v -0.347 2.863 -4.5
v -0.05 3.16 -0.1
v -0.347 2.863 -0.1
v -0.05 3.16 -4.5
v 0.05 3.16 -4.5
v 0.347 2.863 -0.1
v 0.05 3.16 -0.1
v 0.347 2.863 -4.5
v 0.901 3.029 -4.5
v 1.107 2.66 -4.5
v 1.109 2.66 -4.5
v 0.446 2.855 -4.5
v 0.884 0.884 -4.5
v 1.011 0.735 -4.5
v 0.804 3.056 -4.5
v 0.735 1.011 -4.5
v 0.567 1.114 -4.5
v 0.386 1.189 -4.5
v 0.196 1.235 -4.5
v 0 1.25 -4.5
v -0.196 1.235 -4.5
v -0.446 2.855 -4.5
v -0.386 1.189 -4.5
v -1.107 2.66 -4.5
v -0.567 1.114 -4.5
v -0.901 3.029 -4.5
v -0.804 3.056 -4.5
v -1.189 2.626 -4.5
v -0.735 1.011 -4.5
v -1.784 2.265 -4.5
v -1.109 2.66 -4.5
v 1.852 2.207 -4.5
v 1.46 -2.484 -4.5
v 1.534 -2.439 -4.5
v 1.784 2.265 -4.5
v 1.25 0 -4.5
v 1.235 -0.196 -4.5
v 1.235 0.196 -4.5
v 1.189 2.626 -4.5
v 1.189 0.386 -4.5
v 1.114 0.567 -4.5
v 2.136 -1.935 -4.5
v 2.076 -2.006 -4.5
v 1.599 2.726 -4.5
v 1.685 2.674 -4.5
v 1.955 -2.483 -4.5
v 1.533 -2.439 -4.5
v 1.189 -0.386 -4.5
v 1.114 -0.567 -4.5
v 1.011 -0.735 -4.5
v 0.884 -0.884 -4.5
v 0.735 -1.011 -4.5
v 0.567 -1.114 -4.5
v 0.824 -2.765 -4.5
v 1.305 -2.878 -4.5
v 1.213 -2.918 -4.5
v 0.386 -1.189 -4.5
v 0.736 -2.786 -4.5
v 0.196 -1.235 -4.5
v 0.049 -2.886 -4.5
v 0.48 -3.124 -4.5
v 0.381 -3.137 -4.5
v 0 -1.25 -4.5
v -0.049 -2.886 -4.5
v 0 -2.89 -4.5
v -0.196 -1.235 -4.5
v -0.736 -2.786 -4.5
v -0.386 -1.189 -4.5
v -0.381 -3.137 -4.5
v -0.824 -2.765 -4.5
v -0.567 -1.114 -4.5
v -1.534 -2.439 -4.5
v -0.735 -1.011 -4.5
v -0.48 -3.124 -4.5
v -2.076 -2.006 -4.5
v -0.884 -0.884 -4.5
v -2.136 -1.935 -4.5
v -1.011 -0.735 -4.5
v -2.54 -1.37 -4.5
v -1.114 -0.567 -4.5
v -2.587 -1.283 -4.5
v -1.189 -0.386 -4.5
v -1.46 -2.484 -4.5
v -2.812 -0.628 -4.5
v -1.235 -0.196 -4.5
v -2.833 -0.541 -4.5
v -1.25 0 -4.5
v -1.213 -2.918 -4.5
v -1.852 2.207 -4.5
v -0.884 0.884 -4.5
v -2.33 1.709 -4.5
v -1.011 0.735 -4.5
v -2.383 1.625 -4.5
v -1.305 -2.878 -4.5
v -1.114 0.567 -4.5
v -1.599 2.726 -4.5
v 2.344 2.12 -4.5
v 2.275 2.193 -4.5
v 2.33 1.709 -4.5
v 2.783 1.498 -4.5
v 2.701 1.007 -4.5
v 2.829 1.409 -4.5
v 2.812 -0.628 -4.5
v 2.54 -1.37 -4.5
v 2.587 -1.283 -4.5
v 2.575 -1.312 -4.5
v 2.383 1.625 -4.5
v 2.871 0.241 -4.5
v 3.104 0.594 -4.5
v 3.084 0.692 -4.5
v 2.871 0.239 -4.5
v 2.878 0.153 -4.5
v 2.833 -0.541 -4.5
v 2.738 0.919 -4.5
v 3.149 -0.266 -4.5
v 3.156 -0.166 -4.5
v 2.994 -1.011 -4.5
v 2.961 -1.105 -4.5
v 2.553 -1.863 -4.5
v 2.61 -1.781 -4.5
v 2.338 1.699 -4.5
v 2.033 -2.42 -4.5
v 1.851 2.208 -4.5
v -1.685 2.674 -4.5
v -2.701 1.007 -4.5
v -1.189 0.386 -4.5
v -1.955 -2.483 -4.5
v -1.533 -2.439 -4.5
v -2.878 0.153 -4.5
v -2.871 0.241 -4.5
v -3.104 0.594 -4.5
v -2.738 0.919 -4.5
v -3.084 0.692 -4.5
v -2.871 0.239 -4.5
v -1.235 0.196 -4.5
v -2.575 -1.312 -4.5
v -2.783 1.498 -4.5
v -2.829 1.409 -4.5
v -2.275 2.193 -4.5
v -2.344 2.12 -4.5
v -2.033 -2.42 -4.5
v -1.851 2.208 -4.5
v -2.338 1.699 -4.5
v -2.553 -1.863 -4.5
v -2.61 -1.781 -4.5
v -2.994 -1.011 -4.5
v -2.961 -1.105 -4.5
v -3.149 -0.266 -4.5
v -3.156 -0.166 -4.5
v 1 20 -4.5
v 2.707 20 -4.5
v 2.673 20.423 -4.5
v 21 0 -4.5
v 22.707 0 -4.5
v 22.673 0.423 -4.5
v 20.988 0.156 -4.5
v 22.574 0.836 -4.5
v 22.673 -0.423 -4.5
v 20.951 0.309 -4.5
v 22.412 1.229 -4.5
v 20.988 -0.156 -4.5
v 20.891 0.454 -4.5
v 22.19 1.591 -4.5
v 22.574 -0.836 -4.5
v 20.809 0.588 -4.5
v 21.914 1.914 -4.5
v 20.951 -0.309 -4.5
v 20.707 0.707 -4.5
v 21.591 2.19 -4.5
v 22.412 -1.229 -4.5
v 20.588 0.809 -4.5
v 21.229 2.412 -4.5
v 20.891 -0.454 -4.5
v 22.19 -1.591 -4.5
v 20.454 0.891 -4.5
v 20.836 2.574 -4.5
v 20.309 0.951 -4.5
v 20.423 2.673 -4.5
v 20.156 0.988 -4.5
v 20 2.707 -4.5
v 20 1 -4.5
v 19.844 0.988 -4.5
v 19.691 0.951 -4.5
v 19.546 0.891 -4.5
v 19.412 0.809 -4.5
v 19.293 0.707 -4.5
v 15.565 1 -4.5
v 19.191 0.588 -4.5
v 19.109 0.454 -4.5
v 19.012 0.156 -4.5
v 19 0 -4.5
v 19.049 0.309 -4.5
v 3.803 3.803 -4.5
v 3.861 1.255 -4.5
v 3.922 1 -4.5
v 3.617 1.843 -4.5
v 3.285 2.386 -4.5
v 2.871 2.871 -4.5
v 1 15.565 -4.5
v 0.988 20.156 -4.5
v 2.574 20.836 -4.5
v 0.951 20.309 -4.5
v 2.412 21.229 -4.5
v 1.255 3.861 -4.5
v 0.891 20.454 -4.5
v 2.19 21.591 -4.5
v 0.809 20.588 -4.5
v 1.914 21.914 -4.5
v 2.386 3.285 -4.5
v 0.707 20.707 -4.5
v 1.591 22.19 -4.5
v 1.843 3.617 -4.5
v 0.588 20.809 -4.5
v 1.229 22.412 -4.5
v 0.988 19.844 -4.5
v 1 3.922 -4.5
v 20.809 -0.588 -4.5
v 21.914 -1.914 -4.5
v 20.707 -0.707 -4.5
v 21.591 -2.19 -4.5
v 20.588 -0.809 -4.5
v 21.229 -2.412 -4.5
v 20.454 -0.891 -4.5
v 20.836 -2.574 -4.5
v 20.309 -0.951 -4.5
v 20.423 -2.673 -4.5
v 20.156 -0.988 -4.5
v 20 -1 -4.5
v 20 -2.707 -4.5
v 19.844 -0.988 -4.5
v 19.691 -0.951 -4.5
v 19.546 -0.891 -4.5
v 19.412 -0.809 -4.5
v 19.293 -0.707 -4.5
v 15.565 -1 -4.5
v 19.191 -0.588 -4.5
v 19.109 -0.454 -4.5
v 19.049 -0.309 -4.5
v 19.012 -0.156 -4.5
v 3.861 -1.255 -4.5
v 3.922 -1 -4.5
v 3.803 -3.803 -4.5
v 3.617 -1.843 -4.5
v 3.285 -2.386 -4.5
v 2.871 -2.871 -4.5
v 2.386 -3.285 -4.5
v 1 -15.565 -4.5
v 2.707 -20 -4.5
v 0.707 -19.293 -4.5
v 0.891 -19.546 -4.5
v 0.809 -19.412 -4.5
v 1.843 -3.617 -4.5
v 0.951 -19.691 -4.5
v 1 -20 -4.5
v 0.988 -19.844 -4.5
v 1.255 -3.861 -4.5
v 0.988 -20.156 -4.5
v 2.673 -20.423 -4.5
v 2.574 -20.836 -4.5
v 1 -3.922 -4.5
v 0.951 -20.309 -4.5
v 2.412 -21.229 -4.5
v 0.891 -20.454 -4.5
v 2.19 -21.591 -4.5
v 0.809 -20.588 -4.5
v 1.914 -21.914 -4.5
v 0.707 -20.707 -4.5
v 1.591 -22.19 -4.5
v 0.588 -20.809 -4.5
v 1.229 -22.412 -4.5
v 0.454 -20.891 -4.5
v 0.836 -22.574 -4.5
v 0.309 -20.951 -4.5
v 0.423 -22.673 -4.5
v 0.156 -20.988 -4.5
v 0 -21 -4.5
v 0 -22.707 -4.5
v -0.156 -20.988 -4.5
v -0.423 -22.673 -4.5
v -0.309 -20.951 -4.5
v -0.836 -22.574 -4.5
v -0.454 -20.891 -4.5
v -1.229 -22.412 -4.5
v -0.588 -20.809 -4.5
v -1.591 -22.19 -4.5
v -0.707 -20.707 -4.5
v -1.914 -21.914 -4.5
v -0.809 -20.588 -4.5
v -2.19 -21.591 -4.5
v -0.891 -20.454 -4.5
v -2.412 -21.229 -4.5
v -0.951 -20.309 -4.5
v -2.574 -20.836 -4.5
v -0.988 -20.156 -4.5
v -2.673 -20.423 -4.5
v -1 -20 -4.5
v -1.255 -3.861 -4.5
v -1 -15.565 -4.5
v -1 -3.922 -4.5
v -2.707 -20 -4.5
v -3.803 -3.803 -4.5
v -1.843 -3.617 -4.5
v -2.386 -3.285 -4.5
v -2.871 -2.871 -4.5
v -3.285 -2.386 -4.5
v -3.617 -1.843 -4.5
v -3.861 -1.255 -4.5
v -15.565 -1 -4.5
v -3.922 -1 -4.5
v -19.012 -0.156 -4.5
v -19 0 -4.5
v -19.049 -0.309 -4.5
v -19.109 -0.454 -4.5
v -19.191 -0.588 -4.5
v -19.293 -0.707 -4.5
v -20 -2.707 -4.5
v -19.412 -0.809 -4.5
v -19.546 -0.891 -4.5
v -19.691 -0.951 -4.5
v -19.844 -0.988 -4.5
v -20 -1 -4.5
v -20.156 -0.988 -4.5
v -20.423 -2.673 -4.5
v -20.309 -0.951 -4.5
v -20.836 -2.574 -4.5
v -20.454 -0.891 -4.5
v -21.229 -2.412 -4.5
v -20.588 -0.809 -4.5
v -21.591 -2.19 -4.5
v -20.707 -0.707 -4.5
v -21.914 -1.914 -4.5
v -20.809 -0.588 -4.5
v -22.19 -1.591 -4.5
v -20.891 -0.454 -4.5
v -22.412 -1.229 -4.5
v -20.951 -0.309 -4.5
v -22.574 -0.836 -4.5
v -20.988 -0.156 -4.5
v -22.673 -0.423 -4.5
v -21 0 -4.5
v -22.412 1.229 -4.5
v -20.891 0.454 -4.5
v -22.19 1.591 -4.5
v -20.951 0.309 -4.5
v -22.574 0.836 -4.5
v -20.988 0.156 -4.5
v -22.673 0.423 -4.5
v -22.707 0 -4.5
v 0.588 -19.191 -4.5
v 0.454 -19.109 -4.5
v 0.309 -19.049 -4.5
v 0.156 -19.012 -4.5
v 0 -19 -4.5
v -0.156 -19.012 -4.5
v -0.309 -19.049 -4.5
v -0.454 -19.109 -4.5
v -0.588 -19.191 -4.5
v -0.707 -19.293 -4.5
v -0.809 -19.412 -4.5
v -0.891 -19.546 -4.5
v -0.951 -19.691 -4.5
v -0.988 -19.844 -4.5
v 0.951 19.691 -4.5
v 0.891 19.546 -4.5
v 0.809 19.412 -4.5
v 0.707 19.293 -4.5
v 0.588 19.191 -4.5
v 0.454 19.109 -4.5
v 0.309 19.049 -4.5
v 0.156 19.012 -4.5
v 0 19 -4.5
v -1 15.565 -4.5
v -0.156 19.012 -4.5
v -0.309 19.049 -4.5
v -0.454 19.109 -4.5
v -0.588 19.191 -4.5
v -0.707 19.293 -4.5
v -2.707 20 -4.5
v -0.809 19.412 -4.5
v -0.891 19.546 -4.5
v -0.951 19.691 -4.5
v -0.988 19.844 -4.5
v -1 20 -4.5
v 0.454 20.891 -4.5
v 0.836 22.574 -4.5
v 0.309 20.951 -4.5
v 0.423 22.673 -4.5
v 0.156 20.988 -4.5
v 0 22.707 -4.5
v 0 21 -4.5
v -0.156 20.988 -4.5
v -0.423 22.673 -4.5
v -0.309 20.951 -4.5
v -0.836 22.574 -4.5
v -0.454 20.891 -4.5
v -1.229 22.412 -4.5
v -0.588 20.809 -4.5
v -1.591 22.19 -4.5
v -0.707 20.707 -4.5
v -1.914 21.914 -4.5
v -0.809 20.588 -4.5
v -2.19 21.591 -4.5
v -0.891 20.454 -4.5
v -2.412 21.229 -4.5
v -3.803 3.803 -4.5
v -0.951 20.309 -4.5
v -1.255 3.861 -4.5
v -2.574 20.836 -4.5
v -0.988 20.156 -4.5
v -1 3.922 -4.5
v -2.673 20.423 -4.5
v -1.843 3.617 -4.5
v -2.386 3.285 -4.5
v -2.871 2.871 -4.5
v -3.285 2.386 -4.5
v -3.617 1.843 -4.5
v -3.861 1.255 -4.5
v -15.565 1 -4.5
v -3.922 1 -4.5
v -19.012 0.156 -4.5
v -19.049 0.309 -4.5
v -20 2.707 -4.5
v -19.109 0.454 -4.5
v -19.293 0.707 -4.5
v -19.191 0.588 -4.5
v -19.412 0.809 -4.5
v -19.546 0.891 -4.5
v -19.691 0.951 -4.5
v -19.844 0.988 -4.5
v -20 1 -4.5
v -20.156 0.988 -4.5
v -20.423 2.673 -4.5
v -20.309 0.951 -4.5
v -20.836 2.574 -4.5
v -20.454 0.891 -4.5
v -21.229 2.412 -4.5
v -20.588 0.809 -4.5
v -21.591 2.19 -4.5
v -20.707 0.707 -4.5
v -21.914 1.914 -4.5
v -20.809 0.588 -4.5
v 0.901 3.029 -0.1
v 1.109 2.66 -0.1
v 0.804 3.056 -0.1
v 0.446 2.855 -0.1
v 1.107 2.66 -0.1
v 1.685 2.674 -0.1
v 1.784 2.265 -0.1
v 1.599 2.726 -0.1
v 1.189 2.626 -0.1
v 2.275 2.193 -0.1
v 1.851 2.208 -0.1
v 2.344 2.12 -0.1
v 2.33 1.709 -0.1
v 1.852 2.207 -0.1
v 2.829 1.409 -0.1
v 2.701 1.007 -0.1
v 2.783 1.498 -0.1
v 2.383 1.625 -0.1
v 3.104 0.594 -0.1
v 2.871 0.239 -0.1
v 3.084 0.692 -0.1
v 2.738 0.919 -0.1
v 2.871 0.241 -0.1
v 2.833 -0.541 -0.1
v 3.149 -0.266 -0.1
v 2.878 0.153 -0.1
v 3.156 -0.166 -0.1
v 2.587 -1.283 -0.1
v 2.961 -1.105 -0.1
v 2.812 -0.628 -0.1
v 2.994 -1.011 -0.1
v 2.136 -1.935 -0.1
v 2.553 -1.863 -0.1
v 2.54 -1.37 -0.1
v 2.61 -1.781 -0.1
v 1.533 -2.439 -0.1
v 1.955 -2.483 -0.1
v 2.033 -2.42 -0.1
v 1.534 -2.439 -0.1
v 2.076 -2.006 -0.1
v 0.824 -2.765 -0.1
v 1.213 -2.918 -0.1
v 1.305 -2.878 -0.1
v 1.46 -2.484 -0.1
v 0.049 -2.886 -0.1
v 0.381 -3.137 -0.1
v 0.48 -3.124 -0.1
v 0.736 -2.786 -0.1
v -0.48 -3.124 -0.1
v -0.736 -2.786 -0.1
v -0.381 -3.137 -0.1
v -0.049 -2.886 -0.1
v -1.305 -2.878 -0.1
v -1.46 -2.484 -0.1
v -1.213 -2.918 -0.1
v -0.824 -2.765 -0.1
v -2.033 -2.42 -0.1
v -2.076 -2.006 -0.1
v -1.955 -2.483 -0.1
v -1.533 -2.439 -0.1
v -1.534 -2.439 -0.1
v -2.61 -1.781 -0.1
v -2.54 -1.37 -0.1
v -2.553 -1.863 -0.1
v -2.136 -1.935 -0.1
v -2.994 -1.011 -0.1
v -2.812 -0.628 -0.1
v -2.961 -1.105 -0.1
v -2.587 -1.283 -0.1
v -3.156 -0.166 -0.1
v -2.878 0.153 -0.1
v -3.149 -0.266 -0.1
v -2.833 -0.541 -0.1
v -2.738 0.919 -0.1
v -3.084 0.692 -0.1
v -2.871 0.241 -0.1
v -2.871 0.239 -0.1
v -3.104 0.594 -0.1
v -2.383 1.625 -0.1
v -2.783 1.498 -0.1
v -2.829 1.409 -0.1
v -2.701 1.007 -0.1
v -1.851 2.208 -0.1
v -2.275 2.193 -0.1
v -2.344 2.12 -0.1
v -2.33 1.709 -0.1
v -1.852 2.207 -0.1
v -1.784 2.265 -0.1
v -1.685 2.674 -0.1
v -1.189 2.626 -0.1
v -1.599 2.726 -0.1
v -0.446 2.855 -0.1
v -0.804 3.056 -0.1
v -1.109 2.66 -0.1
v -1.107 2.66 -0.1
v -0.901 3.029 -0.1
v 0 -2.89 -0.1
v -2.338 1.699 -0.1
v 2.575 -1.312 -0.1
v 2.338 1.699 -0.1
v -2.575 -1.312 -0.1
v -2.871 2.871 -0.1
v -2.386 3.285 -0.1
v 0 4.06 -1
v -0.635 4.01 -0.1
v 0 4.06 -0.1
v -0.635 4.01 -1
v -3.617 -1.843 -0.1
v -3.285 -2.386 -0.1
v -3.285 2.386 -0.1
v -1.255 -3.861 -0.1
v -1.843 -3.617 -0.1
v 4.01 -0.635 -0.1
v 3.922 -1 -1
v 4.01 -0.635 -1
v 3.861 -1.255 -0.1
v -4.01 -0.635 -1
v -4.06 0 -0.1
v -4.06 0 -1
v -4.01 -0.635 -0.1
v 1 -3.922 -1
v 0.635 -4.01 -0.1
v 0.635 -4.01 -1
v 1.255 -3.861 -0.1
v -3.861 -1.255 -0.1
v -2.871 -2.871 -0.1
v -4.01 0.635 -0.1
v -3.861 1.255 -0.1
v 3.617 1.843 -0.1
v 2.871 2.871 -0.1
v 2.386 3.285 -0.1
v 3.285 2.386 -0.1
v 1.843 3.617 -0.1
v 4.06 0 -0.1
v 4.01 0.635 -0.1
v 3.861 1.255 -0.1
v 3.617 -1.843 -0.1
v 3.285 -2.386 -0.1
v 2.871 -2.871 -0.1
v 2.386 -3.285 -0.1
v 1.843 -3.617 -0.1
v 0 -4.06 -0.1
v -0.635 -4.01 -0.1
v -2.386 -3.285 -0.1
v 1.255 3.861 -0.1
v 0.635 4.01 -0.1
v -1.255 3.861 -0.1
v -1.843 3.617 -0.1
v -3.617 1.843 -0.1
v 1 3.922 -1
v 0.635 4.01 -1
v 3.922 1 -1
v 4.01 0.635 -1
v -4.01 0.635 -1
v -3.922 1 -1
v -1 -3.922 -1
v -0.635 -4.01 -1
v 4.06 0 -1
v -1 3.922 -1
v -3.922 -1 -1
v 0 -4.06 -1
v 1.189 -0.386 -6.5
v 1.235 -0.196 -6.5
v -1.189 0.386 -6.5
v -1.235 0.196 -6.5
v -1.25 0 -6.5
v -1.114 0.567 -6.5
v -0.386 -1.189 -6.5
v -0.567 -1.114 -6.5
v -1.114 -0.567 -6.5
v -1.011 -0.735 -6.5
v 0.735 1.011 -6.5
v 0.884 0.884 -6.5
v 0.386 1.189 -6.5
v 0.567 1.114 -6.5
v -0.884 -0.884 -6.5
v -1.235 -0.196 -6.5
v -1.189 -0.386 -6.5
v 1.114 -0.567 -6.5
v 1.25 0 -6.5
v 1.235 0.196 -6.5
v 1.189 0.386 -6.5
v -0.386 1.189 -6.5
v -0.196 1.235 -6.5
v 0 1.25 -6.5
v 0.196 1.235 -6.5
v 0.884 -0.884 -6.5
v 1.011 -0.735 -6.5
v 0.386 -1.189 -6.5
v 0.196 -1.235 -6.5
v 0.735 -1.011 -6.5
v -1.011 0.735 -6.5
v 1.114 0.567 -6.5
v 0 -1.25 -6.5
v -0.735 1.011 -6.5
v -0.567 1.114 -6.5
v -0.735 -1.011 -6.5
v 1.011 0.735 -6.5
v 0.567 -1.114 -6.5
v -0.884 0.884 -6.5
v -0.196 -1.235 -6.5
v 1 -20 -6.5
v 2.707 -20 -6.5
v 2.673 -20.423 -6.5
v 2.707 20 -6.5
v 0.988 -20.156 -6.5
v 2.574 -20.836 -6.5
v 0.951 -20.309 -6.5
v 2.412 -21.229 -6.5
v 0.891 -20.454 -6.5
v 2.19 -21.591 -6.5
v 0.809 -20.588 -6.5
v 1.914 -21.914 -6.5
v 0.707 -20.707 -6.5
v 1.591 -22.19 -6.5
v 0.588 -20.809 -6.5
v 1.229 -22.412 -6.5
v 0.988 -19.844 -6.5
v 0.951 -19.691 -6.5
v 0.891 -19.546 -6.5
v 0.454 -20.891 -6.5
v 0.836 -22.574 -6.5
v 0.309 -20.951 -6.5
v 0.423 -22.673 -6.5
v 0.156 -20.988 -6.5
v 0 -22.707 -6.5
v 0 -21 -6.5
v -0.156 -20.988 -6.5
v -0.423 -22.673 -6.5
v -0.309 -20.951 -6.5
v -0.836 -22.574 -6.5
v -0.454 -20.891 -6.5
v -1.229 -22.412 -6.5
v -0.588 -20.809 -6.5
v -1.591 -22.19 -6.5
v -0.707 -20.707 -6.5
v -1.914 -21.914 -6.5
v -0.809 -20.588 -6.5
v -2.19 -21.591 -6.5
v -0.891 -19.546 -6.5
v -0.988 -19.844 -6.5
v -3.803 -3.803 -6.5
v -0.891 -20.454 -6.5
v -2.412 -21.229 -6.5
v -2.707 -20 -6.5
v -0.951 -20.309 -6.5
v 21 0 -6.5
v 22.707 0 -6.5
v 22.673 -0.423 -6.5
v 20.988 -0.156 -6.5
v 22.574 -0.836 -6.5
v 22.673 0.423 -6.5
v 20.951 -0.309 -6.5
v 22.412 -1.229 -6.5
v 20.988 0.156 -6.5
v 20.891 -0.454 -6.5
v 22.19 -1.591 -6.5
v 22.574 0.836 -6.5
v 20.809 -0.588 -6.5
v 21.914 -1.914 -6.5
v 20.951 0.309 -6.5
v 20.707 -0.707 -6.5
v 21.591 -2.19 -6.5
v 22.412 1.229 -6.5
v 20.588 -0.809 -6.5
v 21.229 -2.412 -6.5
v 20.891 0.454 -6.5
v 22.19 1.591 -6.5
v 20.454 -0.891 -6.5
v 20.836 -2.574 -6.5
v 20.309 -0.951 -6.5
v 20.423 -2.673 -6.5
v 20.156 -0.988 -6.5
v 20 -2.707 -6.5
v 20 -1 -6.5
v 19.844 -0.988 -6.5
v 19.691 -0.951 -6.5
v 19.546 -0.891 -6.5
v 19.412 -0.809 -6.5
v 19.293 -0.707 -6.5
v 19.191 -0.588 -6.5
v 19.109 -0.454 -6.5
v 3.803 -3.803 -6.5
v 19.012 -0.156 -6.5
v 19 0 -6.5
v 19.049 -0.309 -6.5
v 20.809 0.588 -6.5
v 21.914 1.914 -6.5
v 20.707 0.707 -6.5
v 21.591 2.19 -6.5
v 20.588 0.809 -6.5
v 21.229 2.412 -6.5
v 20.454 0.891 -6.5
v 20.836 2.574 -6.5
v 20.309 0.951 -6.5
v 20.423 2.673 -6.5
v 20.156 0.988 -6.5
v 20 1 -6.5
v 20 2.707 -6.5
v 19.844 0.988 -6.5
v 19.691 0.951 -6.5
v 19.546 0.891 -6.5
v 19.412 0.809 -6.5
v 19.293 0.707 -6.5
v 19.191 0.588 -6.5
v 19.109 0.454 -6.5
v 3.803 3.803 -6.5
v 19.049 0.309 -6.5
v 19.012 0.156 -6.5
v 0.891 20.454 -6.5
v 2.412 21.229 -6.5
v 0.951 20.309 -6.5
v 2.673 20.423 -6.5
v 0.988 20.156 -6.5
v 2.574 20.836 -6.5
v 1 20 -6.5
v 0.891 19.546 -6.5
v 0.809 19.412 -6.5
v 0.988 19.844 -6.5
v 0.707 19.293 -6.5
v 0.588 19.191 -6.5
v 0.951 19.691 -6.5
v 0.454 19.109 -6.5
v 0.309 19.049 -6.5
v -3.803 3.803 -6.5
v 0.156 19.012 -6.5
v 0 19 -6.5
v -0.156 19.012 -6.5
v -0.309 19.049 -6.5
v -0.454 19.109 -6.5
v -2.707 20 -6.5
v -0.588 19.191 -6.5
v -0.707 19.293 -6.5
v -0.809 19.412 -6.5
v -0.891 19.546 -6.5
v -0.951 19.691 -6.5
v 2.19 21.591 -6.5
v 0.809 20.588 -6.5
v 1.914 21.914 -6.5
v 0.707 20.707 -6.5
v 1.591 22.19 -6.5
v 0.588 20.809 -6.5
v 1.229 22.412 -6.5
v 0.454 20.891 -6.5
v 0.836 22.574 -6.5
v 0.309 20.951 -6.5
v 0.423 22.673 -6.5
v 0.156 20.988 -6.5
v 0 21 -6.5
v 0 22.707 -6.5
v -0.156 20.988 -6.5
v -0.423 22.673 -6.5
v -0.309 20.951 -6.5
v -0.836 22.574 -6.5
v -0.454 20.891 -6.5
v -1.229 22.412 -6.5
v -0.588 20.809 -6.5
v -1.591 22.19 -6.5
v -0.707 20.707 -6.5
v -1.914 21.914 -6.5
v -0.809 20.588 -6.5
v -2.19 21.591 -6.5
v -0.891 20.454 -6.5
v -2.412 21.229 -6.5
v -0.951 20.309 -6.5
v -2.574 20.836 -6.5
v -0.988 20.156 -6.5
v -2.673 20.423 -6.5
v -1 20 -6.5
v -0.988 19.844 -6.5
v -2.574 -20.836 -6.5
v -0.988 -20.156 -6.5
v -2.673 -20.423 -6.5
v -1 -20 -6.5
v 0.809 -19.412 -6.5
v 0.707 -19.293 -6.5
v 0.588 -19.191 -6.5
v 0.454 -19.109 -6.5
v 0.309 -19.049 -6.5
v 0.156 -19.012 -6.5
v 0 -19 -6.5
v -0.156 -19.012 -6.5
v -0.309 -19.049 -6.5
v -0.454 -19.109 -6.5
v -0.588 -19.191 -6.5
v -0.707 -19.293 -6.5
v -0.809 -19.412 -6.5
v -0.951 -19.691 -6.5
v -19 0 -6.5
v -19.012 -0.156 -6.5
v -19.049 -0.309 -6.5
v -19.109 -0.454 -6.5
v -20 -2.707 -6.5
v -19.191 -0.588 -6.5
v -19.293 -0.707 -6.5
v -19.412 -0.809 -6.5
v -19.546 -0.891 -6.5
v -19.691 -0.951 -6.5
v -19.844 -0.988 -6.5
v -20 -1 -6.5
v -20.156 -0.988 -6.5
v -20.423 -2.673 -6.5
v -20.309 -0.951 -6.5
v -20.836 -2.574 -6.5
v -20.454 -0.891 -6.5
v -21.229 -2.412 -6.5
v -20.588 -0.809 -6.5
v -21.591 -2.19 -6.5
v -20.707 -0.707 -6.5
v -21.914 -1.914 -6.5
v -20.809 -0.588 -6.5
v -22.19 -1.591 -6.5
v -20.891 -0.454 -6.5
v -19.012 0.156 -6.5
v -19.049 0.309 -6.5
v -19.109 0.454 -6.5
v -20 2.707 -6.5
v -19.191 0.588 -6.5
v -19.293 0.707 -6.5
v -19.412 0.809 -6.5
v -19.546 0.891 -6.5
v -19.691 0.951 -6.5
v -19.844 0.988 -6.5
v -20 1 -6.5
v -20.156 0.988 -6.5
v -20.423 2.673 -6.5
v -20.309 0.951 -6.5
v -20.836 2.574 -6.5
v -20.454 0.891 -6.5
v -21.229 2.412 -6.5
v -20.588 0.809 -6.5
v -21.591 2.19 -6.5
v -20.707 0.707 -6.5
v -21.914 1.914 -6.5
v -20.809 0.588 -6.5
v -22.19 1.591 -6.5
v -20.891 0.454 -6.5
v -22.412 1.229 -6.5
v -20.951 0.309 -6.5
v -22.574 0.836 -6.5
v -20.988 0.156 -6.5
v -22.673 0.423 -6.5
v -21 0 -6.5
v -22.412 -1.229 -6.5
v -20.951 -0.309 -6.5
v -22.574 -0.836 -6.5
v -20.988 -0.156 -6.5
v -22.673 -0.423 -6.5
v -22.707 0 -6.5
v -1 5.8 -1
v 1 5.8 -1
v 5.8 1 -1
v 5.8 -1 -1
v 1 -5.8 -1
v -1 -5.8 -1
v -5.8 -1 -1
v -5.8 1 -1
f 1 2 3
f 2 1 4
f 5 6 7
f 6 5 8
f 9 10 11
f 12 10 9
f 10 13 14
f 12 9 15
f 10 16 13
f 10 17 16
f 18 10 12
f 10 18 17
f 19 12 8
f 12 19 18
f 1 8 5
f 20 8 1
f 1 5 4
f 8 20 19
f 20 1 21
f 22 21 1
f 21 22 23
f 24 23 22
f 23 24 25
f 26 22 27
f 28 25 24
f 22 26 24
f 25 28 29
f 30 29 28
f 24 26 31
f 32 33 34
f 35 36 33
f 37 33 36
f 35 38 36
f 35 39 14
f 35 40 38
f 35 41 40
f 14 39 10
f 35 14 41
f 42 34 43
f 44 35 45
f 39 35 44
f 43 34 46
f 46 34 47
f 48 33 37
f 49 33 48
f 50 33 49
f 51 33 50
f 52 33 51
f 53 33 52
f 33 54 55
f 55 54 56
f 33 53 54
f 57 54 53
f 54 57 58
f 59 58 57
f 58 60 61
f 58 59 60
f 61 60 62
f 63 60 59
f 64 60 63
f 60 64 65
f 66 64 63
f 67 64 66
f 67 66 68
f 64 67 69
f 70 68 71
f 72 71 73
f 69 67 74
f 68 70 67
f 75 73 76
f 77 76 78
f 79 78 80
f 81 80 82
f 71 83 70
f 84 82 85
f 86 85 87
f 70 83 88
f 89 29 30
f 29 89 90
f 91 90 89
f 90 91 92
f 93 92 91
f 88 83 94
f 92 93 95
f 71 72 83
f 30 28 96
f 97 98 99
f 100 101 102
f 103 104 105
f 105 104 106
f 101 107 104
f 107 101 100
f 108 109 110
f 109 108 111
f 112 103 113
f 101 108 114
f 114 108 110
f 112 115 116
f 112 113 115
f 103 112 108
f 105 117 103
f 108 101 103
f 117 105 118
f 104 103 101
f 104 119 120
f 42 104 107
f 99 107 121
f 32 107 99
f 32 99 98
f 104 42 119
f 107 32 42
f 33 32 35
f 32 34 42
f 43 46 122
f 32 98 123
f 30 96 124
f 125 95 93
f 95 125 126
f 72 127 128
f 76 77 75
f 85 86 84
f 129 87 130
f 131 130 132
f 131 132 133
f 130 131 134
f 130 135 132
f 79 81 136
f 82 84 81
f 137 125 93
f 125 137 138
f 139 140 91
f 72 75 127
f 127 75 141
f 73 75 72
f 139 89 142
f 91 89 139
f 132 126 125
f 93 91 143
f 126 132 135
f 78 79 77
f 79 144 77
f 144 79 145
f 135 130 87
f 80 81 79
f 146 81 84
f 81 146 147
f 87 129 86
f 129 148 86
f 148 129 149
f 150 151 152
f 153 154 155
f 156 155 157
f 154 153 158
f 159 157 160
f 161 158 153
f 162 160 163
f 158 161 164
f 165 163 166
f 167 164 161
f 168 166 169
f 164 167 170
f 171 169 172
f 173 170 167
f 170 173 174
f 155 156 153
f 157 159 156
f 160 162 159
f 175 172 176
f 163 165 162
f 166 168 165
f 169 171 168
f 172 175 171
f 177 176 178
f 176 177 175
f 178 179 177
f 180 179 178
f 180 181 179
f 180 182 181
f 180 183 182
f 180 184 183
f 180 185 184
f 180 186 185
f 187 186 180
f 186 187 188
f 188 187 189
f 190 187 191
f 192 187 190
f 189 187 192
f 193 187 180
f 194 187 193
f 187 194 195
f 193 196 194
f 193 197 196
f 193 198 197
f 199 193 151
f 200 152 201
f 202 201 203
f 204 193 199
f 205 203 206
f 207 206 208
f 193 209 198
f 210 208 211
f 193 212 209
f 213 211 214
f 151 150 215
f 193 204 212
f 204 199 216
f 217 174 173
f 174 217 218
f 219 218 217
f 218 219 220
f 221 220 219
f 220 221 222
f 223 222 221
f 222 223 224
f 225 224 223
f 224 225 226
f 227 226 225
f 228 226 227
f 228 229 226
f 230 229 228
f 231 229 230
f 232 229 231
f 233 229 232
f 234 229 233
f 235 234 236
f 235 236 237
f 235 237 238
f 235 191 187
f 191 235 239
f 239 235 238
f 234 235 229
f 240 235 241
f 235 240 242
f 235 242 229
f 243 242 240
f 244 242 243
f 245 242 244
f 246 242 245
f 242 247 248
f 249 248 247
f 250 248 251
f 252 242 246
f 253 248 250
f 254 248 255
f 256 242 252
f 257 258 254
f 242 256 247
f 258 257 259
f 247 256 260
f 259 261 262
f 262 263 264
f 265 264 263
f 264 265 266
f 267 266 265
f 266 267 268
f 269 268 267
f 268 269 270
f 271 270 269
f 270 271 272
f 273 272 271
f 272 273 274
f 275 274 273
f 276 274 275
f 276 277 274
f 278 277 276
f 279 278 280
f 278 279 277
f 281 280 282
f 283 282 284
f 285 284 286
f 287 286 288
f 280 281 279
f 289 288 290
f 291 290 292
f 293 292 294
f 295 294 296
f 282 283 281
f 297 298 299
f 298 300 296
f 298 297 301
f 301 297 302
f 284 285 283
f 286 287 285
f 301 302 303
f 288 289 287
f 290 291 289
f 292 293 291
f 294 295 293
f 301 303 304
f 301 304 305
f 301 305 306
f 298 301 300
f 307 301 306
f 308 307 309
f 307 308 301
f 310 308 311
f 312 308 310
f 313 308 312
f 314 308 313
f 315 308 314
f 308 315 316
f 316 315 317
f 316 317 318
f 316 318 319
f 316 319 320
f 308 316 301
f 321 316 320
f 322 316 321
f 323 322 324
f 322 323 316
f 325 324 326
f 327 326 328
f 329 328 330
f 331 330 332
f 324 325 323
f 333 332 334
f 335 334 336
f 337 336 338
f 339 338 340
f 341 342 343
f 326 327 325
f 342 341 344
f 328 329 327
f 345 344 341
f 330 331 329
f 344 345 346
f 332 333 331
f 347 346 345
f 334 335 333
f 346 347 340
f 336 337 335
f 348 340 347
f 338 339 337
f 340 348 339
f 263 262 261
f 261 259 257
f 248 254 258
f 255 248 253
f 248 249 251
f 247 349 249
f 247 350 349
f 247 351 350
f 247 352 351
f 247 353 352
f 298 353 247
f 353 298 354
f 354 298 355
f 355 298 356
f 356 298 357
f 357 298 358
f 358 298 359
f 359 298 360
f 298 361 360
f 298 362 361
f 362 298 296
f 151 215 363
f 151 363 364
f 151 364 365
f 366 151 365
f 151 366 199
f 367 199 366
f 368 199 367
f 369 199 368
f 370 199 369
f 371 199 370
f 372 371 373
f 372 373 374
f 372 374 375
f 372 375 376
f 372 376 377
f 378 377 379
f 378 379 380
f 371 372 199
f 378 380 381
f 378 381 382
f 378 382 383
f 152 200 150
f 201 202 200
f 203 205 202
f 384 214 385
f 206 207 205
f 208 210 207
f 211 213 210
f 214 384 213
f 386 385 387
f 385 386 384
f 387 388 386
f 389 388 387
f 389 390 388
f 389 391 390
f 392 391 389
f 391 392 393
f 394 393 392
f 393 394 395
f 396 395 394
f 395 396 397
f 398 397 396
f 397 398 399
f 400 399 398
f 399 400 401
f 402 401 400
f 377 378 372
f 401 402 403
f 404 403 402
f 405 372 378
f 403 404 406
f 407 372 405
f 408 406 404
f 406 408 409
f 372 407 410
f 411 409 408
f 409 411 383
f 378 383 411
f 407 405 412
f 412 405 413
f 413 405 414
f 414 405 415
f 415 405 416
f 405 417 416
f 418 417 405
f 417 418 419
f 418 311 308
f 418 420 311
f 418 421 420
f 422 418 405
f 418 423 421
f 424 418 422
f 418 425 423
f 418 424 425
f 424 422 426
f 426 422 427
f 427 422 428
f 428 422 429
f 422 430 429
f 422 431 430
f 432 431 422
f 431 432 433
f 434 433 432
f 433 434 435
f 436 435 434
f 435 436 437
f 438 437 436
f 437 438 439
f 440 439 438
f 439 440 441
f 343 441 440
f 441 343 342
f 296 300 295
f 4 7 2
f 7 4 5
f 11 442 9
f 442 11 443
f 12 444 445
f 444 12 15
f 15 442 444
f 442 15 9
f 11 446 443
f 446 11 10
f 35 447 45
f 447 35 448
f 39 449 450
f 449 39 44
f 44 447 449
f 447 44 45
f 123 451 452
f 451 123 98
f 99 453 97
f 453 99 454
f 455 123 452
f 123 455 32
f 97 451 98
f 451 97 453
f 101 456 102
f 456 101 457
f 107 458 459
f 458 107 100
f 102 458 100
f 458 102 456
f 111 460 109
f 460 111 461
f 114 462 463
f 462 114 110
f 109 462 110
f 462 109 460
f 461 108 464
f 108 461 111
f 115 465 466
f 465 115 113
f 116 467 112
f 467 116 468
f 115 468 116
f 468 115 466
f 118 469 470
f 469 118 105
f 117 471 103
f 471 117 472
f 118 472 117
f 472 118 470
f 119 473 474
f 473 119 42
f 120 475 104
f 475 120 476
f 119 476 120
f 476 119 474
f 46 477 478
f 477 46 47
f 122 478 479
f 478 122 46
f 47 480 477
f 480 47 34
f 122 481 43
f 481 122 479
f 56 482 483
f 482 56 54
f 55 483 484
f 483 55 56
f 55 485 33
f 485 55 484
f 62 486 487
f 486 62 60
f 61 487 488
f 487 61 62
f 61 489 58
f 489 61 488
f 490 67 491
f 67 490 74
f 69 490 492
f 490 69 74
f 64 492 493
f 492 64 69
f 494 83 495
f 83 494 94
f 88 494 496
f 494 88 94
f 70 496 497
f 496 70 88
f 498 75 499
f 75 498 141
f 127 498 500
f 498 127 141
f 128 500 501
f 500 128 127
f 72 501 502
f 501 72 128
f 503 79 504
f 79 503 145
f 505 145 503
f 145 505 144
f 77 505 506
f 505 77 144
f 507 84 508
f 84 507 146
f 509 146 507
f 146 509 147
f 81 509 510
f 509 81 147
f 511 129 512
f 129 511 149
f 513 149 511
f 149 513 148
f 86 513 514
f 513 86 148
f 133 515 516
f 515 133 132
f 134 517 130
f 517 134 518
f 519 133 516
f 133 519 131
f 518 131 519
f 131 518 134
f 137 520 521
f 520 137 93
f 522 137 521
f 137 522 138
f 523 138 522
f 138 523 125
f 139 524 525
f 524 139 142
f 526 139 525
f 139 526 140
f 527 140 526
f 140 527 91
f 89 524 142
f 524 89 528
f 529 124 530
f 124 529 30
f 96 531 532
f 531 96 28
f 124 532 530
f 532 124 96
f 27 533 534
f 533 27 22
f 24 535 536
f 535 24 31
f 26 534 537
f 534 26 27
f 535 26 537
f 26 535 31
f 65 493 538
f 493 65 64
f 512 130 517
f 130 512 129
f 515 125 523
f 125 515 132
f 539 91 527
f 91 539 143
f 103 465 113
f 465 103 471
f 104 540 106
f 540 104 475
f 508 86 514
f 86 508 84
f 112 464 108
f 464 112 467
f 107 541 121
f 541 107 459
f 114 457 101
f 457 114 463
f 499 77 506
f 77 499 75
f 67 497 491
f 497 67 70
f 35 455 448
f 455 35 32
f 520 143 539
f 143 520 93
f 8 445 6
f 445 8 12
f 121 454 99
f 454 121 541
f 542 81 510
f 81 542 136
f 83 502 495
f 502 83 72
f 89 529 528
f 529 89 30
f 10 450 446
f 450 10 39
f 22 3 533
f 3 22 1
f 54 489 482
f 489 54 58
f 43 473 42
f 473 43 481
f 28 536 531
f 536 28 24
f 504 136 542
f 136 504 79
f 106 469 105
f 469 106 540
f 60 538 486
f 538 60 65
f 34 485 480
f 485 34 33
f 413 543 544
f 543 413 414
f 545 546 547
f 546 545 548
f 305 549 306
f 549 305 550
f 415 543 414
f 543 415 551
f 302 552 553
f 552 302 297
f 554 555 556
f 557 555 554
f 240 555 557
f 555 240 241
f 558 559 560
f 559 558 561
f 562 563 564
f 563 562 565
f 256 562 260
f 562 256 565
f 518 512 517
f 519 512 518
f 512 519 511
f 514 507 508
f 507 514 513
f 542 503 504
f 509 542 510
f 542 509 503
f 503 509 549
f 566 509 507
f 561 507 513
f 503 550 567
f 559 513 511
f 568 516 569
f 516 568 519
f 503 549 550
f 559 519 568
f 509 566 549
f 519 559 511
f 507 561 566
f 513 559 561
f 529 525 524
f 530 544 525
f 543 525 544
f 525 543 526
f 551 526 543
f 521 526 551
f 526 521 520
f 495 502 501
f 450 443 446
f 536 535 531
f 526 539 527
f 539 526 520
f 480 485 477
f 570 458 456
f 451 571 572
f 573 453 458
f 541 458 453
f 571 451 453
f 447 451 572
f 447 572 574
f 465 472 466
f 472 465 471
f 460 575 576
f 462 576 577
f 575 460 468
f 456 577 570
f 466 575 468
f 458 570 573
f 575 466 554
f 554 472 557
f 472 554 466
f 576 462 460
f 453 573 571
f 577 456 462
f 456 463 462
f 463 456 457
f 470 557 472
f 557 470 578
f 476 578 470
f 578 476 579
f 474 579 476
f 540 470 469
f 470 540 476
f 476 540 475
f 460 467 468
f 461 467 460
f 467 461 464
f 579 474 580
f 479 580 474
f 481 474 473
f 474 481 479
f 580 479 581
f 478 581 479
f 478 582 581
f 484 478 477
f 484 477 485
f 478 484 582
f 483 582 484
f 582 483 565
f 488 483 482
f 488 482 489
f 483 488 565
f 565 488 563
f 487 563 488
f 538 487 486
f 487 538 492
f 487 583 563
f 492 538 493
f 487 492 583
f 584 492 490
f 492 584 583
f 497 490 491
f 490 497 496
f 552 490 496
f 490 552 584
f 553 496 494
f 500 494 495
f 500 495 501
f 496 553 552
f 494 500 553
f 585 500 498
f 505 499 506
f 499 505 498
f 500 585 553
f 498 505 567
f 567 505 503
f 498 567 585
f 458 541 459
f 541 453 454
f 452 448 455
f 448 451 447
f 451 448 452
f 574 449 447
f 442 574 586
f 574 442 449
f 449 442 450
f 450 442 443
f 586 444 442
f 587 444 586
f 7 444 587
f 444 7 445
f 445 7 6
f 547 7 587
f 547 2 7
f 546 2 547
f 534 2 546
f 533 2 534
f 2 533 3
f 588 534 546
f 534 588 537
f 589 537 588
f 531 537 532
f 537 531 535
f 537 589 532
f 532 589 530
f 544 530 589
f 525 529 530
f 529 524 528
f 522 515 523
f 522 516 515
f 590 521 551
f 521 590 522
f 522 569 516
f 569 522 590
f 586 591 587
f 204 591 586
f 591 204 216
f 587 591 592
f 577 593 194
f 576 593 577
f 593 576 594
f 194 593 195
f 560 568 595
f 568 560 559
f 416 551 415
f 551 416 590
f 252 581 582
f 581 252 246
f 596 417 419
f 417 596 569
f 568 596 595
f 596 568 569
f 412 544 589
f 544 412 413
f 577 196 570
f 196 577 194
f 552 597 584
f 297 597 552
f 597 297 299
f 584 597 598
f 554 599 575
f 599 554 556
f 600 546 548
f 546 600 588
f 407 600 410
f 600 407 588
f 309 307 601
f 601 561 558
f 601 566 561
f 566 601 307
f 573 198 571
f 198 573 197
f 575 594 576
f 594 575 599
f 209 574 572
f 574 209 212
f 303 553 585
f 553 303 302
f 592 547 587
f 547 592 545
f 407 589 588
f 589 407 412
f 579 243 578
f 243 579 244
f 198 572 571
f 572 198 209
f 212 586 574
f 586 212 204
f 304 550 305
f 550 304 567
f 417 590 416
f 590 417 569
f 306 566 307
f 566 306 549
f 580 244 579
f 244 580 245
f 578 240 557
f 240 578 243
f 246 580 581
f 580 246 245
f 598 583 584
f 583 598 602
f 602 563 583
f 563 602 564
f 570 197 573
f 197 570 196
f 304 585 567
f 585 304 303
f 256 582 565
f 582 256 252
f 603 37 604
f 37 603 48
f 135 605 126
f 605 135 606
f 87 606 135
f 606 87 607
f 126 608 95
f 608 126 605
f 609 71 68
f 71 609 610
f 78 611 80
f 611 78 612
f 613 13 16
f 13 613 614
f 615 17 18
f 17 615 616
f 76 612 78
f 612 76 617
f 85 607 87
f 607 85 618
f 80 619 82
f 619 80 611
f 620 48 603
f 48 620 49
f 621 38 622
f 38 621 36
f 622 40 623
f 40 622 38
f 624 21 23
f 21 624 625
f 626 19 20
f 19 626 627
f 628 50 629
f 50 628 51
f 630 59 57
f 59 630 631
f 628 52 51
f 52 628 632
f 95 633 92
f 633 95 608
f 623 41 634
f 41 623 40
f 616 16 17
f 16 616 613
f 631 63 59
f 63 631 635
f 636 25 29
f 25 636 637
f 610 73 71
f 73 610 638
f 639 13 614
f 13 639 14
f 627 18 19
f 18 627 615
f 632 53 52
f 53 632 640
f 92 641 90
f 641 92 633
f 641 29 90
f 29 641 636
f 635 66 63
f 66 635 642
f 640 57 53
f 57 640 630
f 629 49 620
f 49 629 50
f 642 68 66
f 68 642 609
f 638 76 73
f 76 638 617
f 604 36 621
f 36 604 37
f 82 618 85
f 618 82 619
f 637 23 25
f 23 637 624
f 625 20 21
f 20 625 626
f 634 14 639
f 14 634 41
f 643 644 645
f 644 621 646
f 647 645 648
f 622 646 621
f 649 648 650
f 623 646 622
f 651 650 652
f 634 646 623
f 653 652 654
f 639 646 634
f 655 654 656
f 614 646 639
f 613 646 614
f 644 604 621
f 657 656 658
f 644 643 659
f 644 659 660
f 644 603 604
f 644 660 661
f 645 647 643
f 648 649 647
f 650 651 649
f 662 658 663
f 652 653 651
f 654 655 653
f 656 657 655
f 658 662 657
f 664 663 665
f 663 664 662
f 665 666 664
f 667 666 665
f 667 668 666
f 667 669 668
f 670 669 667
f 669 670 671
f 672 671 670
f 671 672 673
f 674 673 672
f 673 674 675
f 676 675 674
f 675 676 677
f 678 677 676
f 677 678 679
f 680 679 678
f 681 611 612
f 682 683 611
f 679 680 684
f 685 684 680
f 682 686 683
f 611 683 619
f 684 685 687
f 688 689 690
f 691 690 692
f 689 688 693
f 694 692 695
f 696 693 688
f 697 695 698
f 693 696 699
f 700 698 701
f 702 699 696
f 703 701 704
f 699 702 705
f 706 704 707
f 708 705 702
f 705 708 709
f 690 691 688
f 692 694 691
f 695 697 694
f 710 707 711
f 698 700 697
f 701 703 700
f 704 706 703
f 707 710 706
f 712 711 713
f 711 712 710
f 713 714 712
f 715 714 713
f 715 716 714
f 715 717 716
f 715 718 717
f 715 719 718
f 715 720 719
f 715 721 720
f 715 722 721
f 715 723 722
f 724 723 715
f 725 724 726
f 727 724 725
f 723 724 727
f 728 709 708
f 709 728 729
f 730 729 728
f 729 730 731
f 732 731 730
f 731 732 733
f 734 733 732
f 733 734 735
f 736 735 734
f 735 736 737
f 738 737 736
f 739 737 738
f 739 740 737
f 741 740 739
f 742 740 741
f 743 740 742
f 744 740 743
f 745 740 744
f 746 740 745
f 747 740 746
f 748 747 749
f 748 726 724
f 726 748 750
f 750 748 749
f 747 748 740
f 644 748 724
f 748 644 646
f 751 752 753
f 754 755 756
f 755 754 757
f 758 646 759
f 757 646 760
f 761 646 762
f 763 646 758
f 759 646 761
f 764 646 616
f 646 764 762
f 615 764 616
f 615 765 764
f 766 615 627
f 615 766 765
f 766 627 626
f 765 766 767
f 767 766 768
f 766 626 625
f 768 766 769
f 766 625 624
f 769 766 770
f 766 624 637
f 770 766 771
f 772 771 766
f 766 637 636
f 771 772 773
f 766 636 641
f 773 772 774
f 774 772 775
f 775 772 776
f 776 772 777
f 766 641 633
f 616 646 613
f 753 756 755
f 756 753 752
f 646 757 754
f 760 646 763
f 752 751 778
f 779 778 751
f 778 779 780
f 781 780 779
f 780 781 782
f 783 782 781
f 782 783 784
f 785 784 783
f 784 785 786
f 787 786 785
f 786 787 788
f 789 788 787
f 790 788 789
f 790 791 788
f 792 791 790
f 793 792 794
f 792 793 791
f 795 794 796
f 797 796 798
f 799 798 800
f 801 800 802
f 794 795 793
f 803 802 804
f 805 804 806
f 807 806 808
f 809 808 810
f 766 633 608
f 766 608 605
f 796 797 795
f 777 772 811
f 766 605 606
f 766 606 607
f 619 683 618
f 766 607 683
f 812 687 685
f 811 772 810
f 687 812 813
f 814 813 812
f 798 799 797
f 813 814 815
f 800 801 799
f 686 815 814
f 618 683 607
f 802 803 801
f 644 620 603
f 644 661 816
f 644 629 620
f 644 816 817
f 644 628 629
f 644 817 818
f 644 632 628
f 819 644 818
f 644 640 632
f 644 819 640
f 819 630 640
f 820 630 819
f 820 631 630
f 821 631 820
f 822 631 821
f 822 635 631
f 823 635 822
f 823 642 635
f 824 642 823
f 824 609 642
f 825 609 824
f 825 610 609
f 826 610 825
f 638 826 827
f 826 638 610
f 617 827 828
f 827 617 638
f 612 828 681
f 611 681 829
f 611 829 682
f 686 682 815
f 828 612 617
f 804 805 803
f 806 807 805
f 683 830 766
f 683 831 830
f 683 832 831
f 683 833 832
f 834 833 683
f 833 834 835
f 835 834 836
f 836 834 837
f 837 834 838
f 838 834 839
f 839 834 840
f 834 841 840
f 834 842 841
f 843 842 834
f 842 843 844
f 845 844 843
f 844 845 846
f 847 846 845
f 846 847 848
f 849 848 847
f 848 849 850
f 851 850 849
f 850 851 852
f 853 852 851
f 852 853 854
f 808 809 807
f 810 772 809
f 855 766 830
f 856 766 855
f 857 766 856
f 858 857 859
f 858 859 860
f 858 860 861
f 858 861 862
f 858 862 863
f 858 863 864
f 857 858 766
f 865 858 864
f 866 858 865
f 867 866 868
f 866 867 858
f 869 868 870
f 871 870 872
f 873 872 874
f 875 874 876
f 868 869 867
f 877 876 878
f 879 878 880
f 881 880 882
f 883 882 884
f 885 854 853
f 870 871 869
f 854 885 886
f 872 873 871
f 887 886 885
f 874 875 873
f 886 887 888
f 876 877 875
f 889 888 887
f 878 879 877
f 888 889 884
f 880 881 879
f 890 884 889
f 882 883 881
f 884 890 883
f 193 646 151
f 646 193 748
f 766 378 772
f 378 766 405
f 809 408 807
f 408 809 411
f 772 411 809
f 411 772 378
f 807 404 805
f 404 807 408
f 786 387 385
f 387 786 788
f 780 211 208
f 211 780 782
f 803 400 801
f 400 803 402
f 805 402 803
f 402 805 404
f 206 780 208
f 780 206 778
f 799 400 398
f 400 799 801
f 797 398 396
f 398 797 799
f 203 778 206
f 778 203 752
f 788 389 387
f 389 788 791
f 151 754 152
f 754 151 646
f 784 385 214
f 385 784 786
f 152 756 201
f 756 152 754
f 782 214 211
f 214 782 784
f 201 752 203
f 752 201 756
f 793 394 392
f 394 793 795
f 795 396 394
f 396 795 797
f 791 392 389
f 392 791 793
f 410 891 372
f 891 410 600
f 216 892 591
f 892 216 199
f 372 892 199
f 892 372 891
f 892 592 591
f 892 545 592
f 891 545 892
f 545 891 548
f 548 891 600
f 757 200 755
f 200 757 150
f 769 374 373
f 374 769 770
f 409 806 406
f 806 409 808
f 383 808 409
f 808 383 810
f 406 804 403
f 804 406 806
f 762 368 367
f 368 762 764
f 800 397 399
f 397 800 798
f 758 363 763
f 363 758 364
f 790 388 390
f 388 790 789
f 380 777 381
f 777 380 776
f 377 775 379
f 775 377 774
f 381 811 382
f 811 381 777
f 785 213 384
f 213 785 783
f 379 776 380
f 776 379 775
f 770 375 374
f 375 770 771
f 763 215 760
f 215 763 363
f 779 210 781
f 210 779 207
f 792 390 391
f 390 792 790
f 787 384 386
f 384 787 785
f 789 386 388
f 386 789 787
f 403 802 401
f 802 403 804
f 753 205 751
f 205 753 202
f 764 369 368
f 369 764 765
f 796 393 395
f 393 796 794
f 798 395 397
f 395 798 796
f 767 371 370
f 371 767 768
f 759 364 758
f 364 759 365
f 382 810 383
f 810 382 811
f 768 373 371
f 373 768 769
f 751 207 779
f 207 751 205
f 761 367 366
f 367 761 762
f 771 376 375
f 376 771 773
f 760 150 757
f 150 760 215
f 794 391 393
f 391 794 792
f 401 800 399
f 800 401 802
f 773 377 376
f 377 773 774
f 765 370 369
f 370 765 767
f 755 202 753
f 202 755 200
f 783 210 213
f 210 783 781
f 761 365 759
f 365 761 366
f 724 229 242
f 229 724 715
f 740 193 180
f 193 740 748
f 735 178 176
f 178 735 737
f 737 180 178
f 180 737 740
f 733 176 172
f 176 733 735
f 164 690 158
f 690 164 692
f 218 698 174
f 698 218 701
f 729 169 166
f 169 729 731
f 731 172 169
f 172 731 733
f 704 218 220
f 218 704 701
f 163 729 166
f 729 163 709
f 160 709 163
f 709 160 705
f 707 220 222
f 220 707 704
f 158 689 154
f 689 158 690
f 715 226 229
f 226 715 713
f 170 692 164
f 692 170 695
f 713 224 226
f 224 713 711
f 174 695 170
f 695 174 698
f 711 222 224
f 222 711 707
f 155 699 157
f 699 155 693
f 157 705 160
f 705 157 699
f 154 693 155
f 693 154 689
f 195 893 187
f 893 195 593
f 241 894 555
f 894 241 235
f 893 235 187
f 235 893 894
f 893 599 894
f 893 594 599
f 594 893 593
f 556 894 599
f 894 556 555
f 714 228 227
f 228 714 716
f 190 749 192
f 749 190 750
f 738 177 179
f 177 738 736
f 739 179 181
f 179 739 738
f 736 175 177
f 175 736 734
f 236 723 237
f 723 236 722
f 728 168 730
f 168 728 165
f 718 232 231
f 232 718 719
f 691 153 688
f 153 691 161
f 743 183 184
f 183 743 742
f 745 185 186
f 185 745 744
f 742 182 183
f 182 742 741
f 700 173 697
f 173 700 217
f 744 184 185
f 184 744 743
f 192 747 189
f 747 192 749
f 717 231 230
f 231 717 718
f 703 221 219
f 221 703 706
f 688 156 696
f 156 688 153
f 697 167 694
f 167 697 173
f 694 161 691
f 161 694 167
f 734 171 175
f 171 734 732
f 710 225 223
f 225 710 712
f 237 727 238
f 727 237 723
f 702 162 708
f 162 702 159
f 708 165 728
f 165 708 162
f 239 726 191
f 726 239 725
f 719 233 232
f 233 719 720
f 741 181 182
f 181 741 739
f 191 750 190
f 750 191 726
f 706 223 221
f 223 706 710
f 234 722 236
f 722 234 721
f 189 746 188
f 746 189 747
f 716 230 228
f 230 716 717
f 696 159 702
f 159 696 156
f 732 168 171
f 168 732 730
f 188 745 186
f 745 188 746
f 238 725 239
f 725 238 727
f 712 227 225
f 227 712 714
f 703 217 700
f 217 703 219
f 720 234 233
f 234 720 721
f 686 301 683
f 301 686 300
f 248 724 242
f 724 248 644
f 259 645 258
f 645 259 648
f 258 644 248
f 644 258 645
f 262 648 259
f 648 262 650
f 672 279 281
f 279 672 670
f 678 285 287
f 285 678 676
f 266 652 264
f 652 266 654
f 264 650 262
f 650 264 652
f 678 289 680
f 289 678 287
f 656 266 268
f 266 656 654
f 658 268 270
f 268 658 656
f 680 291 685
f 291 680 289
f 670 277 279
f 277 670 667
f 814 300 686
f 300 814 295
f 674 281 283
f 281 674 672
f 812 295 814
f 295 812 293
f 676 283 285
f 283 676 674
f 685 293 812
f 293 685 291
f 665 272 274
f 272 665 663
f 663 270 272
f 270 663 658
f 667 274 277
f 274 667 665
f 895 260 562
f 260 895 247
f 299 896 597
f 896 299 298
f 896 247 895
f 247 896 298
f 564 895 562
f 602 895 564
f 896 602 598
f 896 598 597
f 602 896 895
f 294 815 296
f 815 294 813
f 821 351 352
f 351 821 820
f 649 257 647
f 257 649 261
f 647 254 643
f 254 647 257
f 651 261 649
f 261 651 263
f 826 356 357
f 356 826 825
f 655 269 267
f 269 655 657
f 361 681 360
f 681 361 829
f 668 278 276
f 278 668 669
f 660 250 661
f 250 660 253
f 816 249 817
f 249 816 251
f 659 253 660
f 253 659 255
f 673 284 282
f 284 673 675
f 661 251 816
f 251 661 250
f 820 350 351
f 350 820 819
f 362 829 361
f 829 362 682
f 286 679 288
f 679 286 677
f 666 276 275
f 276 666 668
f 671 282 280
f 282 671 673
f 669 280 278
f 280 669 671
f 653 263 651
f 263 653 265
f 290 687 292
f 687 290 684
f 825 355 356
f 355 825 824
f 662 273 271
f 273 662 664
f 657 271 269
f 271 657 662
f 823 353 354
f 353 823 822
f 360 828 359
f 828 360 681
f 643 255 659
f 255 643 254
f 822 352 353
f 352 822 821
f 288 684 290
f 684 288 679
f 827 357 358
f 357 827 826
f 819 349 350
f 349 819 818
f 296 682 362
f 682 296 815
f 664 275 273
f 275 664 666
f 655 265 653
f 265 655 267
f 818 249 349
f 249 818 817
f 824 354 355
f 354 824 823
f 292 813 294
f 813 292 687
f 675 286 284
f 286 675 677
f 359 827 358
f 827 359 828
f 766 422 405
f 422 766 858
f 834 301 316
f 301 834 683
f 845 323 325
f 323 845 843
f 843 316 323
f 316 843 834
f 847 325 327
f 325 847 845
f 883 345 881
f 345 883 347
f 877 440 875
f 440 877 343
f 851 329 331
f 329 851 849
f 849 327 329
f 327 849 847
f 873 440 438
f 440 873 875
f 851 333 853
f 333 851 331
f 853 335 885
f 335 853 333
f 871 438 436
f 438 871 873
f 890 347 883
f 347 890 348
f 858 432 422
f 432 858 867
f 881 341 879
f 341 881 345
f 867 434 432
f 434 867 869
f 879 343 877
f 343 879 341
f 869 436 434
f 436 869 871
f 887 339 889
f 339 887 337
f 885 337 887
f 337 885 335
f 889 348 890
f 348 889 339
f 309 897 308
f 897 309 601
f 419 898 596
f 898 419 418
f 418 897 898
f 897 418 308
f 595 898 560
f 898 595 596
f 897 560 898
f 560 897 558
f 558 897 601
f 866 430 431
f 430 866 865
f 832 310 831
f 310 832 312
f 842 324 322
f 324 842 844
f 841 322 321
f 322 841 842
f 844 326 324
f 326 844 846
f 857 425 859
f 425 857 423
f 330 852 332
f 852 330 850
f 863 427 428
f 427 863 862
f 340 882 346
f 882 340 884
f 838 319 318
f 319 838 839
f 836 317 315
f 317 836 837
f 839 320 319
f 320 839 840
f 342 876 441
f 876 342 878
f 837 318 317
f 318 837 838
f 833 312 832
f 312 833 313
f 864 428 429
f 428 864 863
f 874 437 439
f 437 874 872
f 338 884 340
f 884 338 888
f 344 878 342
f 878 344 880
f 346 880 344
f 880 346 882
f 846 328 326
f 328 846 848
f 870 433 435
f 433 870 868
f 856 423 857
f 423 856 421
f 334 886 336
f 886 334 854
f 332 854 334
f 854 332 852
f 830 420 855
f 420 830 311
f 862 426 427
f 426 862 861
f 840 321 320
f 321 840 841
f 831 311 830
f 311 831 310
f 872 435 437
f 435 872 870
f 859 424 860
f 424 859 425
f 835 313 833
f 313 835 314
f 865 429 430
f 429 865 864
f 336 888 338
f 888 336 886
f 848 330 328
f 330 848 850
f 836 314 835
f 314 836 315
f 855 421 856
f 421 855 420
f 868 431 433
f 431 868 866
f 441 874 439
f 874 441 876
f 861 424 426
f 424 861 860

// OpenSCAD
/**
 *  Parametric servo arm generator for OpenScad
 *  Générateur de palonnier de servo pour OpenScad
 *
 *  Copyright (c) 2012 Charles Rincheval.  All rights reserved.
 *
 *  This library is free software; you can redistribute it and/or
 *  modify it under the terms of the GNU Lesser General Public
 *  License as published by the Free Software Foundation; either
 *  version 2.1 of the License, or (at your option) any later version.
 *
 *  This library is distributed in the hope that it will be useful,
 *  but WITHOUT ANY WARRANTY; without even the implied warranty of
 *  MERCHANTABILITY or FITNESS FOR A PARTICULAR PURPOSE.  See the GNU
 *  Lesser General Public License for more details.
 *
 *  You should have received a copy of the GNU Lesser General Public
 *  License along with this library; if not, write to the Free Software
 *  Foundation, Inc., 51 Franklin St, Fifth Floor, Boston, MA  02110-1301  USA
 *
 *  Last update :
 *  https://github.com/hugokernel/OpenSCAD_ServoArms
 *
 *  http://www.digitalspirit.org/
 */

$fn = 40;

/**
 *  Clear between arm head and servo head
 *  With PLA material, use clear : 0.3, for ABS, use 0.2
 */
SERVO_HEAD_CLEAR = 0.2;

/**
 *  Head / Tooth parameters
 *  Futaba 3F Standard Spline
 *  http://www.servocity.com/html/futaba_servo_splines.html
 *
 *  First array (head related) :
 *  0. Head external diameter
 *  1. Head heigth
 *  2. Head thickness
 *  3. Head screw diameter
 *
 *  Second array (tooth related) :
 *  0. Tooth count
 *  1. Tooth height
 *  2. Tooth length
 *  3. Tooth width
 */
FUTABA_3F_SPLINE = [
    [5.92, 4.5, 1.1, 2.5],
    [23, 0.3, 0.7, 0.1]
];

module servo_futaba_3f(length, count) {
    servo_arm(FUTABA_3F_SPLINE, [length, count]);
}

/**
 *  If you want to support a new servo, juste add a new spline definition array
 *  and a module named like servo_XXX_YYY where XXX is servo brand and YYY is the
 *  connection type (3f) or the servo type (s3003)
 */

module servo_standard(length, count) {
    servo_futaba_3f(length, count);
}

/**
 *  Tooth
 *
 *    |<-w->|
 *    |_____|___
 *    /     \  ^h
 *  _/       \_v
 *   |<--l-->|
 *
 *  - tooth length (l)
 *  - tooth width (w)
 *  - tooth height (h)
 *  - height
 *
 */
module servo_head_tooth(length, width, height, head_height) {
    linear_extrude(height = head_height) {
        polygon([[-length / 2, 0], [-width / 2, height], [width / 2, height], [length / 2,0]]);
    }
}

/**
 *  Servo head
 */
module servo_head(params, clear = SERVO_HEAD_CLEAR) {

    head = params[0];
    tooth = params[1];

    head_diameter = head[0];
    head_heigth = head[1];

    tooth_count = tooth[0];
    tooth_height = tooth[1];
    tooth_length = tooth[2];
    tooth_width = tooth[3];

    % cylinder(r = head_diameter / 2, h = head_heigth + 1);

    cylinder(r = head_diameter / 2 - tooth_height + 0.03 + clear, h = head_heigth);

    for (i = [0 : tooth_count]) {
        rotate([0, 0, i * (360 / tooth_count)]) {
            translate([0, head_diameter / 2 - tooth_height + clear, 0]) {
                servo_head_tooth(tooth_length, tooth_width, tooth_height, head_heigth);
            }
        }
    }
}

/**
 *  Servo hold
 *  - Head / Tooth parameters
 *  - Arms params (length and count)
 */
module servo_arm(params, arms) {

    head = params[0];
    tooth = params[1];

    head_diameter = head[0];
    head_heigth = head[1];
    head_thickness = head[2];
    head_screw_diameter = head[3];

    tooth_length = tooth[2];
    tooth_width = tooth[3];

    arm_length = arms[0];
    arm_count = arms[1];

    /**
     *  Servo arm
     *  - length is from center to last hole
     */
    module arm(tooth_length, tooth_width, head_height, head_heigth, hole_count = 1) {

        arm_screw_diameter = 2;

        difference() {
            union() {
                cylinder(r = tooth_width / 2, h = head_heigth);

                linear_extrude(height = head_heigth) {
                    polygon([
                        [-tooth_width / 2, 0], [-tooth_width / 3, tooth_length],
                        [tooth_width / 3, tooth_length], [tooth_width / 2, 0]
                    ]);
                }

                translate([0, tooth_length, 0]) {
                    cylinder(r = tooth_width / 3, h = head_heigth);
                }

                if (tooth_length >= 12) {
                    translate([-head_heigth / 2 + 2, 3.8, -4]) {
                        rotate([90, 0, 0]) {
                            rotate([0, -90, 0]) {
                                linear_extrude(height = head_heigth) {
                                    polygon([
                                        [-tooth_length / 1.7, 4], [0, 4], [0, - head_height + 5],
                                        [-2, - head_height + 5]
                                    ]);
                                }
                            }
                        }
                    }
                }
            }

            // Hole
            for (i = [0 : hole_count - 1]) {
                //translate([0, length - (length / hole_count * i), -1]) {
                translate([0, tooth_length - (4 * i), -1]) {
                    cylinder(r = arm_screw_diameter / 2, h = 10);
                }
            }

            cylinder(r = head_screw_diameter / 2, h = 10);
        }
    }

    difference() {
        translate([0, 0, 0.1]) {
            cylinder(r = head_diameter / 2 + head_thickness, h = head_heigth + 1);
        }

        cylinder(r = head_screw_diameter / 2, h = 10);

        servo_head(params);
    }

    arm_thickness = head_thickness;

    // Arm
    translate([0, 0, head_heigth]) {
        for (i = [0 : arm_count - 1]) {
            rotate([0, 0, i * (360 / arm_count)]) {
                arm(arm_length, head_diameter + arm_thickness * 2, head_heigth, 2);
            }
        }
    }
}

module demo() {
    rotate([0, 180, 0])
        servo_standard(20, 4);
}

demo();
